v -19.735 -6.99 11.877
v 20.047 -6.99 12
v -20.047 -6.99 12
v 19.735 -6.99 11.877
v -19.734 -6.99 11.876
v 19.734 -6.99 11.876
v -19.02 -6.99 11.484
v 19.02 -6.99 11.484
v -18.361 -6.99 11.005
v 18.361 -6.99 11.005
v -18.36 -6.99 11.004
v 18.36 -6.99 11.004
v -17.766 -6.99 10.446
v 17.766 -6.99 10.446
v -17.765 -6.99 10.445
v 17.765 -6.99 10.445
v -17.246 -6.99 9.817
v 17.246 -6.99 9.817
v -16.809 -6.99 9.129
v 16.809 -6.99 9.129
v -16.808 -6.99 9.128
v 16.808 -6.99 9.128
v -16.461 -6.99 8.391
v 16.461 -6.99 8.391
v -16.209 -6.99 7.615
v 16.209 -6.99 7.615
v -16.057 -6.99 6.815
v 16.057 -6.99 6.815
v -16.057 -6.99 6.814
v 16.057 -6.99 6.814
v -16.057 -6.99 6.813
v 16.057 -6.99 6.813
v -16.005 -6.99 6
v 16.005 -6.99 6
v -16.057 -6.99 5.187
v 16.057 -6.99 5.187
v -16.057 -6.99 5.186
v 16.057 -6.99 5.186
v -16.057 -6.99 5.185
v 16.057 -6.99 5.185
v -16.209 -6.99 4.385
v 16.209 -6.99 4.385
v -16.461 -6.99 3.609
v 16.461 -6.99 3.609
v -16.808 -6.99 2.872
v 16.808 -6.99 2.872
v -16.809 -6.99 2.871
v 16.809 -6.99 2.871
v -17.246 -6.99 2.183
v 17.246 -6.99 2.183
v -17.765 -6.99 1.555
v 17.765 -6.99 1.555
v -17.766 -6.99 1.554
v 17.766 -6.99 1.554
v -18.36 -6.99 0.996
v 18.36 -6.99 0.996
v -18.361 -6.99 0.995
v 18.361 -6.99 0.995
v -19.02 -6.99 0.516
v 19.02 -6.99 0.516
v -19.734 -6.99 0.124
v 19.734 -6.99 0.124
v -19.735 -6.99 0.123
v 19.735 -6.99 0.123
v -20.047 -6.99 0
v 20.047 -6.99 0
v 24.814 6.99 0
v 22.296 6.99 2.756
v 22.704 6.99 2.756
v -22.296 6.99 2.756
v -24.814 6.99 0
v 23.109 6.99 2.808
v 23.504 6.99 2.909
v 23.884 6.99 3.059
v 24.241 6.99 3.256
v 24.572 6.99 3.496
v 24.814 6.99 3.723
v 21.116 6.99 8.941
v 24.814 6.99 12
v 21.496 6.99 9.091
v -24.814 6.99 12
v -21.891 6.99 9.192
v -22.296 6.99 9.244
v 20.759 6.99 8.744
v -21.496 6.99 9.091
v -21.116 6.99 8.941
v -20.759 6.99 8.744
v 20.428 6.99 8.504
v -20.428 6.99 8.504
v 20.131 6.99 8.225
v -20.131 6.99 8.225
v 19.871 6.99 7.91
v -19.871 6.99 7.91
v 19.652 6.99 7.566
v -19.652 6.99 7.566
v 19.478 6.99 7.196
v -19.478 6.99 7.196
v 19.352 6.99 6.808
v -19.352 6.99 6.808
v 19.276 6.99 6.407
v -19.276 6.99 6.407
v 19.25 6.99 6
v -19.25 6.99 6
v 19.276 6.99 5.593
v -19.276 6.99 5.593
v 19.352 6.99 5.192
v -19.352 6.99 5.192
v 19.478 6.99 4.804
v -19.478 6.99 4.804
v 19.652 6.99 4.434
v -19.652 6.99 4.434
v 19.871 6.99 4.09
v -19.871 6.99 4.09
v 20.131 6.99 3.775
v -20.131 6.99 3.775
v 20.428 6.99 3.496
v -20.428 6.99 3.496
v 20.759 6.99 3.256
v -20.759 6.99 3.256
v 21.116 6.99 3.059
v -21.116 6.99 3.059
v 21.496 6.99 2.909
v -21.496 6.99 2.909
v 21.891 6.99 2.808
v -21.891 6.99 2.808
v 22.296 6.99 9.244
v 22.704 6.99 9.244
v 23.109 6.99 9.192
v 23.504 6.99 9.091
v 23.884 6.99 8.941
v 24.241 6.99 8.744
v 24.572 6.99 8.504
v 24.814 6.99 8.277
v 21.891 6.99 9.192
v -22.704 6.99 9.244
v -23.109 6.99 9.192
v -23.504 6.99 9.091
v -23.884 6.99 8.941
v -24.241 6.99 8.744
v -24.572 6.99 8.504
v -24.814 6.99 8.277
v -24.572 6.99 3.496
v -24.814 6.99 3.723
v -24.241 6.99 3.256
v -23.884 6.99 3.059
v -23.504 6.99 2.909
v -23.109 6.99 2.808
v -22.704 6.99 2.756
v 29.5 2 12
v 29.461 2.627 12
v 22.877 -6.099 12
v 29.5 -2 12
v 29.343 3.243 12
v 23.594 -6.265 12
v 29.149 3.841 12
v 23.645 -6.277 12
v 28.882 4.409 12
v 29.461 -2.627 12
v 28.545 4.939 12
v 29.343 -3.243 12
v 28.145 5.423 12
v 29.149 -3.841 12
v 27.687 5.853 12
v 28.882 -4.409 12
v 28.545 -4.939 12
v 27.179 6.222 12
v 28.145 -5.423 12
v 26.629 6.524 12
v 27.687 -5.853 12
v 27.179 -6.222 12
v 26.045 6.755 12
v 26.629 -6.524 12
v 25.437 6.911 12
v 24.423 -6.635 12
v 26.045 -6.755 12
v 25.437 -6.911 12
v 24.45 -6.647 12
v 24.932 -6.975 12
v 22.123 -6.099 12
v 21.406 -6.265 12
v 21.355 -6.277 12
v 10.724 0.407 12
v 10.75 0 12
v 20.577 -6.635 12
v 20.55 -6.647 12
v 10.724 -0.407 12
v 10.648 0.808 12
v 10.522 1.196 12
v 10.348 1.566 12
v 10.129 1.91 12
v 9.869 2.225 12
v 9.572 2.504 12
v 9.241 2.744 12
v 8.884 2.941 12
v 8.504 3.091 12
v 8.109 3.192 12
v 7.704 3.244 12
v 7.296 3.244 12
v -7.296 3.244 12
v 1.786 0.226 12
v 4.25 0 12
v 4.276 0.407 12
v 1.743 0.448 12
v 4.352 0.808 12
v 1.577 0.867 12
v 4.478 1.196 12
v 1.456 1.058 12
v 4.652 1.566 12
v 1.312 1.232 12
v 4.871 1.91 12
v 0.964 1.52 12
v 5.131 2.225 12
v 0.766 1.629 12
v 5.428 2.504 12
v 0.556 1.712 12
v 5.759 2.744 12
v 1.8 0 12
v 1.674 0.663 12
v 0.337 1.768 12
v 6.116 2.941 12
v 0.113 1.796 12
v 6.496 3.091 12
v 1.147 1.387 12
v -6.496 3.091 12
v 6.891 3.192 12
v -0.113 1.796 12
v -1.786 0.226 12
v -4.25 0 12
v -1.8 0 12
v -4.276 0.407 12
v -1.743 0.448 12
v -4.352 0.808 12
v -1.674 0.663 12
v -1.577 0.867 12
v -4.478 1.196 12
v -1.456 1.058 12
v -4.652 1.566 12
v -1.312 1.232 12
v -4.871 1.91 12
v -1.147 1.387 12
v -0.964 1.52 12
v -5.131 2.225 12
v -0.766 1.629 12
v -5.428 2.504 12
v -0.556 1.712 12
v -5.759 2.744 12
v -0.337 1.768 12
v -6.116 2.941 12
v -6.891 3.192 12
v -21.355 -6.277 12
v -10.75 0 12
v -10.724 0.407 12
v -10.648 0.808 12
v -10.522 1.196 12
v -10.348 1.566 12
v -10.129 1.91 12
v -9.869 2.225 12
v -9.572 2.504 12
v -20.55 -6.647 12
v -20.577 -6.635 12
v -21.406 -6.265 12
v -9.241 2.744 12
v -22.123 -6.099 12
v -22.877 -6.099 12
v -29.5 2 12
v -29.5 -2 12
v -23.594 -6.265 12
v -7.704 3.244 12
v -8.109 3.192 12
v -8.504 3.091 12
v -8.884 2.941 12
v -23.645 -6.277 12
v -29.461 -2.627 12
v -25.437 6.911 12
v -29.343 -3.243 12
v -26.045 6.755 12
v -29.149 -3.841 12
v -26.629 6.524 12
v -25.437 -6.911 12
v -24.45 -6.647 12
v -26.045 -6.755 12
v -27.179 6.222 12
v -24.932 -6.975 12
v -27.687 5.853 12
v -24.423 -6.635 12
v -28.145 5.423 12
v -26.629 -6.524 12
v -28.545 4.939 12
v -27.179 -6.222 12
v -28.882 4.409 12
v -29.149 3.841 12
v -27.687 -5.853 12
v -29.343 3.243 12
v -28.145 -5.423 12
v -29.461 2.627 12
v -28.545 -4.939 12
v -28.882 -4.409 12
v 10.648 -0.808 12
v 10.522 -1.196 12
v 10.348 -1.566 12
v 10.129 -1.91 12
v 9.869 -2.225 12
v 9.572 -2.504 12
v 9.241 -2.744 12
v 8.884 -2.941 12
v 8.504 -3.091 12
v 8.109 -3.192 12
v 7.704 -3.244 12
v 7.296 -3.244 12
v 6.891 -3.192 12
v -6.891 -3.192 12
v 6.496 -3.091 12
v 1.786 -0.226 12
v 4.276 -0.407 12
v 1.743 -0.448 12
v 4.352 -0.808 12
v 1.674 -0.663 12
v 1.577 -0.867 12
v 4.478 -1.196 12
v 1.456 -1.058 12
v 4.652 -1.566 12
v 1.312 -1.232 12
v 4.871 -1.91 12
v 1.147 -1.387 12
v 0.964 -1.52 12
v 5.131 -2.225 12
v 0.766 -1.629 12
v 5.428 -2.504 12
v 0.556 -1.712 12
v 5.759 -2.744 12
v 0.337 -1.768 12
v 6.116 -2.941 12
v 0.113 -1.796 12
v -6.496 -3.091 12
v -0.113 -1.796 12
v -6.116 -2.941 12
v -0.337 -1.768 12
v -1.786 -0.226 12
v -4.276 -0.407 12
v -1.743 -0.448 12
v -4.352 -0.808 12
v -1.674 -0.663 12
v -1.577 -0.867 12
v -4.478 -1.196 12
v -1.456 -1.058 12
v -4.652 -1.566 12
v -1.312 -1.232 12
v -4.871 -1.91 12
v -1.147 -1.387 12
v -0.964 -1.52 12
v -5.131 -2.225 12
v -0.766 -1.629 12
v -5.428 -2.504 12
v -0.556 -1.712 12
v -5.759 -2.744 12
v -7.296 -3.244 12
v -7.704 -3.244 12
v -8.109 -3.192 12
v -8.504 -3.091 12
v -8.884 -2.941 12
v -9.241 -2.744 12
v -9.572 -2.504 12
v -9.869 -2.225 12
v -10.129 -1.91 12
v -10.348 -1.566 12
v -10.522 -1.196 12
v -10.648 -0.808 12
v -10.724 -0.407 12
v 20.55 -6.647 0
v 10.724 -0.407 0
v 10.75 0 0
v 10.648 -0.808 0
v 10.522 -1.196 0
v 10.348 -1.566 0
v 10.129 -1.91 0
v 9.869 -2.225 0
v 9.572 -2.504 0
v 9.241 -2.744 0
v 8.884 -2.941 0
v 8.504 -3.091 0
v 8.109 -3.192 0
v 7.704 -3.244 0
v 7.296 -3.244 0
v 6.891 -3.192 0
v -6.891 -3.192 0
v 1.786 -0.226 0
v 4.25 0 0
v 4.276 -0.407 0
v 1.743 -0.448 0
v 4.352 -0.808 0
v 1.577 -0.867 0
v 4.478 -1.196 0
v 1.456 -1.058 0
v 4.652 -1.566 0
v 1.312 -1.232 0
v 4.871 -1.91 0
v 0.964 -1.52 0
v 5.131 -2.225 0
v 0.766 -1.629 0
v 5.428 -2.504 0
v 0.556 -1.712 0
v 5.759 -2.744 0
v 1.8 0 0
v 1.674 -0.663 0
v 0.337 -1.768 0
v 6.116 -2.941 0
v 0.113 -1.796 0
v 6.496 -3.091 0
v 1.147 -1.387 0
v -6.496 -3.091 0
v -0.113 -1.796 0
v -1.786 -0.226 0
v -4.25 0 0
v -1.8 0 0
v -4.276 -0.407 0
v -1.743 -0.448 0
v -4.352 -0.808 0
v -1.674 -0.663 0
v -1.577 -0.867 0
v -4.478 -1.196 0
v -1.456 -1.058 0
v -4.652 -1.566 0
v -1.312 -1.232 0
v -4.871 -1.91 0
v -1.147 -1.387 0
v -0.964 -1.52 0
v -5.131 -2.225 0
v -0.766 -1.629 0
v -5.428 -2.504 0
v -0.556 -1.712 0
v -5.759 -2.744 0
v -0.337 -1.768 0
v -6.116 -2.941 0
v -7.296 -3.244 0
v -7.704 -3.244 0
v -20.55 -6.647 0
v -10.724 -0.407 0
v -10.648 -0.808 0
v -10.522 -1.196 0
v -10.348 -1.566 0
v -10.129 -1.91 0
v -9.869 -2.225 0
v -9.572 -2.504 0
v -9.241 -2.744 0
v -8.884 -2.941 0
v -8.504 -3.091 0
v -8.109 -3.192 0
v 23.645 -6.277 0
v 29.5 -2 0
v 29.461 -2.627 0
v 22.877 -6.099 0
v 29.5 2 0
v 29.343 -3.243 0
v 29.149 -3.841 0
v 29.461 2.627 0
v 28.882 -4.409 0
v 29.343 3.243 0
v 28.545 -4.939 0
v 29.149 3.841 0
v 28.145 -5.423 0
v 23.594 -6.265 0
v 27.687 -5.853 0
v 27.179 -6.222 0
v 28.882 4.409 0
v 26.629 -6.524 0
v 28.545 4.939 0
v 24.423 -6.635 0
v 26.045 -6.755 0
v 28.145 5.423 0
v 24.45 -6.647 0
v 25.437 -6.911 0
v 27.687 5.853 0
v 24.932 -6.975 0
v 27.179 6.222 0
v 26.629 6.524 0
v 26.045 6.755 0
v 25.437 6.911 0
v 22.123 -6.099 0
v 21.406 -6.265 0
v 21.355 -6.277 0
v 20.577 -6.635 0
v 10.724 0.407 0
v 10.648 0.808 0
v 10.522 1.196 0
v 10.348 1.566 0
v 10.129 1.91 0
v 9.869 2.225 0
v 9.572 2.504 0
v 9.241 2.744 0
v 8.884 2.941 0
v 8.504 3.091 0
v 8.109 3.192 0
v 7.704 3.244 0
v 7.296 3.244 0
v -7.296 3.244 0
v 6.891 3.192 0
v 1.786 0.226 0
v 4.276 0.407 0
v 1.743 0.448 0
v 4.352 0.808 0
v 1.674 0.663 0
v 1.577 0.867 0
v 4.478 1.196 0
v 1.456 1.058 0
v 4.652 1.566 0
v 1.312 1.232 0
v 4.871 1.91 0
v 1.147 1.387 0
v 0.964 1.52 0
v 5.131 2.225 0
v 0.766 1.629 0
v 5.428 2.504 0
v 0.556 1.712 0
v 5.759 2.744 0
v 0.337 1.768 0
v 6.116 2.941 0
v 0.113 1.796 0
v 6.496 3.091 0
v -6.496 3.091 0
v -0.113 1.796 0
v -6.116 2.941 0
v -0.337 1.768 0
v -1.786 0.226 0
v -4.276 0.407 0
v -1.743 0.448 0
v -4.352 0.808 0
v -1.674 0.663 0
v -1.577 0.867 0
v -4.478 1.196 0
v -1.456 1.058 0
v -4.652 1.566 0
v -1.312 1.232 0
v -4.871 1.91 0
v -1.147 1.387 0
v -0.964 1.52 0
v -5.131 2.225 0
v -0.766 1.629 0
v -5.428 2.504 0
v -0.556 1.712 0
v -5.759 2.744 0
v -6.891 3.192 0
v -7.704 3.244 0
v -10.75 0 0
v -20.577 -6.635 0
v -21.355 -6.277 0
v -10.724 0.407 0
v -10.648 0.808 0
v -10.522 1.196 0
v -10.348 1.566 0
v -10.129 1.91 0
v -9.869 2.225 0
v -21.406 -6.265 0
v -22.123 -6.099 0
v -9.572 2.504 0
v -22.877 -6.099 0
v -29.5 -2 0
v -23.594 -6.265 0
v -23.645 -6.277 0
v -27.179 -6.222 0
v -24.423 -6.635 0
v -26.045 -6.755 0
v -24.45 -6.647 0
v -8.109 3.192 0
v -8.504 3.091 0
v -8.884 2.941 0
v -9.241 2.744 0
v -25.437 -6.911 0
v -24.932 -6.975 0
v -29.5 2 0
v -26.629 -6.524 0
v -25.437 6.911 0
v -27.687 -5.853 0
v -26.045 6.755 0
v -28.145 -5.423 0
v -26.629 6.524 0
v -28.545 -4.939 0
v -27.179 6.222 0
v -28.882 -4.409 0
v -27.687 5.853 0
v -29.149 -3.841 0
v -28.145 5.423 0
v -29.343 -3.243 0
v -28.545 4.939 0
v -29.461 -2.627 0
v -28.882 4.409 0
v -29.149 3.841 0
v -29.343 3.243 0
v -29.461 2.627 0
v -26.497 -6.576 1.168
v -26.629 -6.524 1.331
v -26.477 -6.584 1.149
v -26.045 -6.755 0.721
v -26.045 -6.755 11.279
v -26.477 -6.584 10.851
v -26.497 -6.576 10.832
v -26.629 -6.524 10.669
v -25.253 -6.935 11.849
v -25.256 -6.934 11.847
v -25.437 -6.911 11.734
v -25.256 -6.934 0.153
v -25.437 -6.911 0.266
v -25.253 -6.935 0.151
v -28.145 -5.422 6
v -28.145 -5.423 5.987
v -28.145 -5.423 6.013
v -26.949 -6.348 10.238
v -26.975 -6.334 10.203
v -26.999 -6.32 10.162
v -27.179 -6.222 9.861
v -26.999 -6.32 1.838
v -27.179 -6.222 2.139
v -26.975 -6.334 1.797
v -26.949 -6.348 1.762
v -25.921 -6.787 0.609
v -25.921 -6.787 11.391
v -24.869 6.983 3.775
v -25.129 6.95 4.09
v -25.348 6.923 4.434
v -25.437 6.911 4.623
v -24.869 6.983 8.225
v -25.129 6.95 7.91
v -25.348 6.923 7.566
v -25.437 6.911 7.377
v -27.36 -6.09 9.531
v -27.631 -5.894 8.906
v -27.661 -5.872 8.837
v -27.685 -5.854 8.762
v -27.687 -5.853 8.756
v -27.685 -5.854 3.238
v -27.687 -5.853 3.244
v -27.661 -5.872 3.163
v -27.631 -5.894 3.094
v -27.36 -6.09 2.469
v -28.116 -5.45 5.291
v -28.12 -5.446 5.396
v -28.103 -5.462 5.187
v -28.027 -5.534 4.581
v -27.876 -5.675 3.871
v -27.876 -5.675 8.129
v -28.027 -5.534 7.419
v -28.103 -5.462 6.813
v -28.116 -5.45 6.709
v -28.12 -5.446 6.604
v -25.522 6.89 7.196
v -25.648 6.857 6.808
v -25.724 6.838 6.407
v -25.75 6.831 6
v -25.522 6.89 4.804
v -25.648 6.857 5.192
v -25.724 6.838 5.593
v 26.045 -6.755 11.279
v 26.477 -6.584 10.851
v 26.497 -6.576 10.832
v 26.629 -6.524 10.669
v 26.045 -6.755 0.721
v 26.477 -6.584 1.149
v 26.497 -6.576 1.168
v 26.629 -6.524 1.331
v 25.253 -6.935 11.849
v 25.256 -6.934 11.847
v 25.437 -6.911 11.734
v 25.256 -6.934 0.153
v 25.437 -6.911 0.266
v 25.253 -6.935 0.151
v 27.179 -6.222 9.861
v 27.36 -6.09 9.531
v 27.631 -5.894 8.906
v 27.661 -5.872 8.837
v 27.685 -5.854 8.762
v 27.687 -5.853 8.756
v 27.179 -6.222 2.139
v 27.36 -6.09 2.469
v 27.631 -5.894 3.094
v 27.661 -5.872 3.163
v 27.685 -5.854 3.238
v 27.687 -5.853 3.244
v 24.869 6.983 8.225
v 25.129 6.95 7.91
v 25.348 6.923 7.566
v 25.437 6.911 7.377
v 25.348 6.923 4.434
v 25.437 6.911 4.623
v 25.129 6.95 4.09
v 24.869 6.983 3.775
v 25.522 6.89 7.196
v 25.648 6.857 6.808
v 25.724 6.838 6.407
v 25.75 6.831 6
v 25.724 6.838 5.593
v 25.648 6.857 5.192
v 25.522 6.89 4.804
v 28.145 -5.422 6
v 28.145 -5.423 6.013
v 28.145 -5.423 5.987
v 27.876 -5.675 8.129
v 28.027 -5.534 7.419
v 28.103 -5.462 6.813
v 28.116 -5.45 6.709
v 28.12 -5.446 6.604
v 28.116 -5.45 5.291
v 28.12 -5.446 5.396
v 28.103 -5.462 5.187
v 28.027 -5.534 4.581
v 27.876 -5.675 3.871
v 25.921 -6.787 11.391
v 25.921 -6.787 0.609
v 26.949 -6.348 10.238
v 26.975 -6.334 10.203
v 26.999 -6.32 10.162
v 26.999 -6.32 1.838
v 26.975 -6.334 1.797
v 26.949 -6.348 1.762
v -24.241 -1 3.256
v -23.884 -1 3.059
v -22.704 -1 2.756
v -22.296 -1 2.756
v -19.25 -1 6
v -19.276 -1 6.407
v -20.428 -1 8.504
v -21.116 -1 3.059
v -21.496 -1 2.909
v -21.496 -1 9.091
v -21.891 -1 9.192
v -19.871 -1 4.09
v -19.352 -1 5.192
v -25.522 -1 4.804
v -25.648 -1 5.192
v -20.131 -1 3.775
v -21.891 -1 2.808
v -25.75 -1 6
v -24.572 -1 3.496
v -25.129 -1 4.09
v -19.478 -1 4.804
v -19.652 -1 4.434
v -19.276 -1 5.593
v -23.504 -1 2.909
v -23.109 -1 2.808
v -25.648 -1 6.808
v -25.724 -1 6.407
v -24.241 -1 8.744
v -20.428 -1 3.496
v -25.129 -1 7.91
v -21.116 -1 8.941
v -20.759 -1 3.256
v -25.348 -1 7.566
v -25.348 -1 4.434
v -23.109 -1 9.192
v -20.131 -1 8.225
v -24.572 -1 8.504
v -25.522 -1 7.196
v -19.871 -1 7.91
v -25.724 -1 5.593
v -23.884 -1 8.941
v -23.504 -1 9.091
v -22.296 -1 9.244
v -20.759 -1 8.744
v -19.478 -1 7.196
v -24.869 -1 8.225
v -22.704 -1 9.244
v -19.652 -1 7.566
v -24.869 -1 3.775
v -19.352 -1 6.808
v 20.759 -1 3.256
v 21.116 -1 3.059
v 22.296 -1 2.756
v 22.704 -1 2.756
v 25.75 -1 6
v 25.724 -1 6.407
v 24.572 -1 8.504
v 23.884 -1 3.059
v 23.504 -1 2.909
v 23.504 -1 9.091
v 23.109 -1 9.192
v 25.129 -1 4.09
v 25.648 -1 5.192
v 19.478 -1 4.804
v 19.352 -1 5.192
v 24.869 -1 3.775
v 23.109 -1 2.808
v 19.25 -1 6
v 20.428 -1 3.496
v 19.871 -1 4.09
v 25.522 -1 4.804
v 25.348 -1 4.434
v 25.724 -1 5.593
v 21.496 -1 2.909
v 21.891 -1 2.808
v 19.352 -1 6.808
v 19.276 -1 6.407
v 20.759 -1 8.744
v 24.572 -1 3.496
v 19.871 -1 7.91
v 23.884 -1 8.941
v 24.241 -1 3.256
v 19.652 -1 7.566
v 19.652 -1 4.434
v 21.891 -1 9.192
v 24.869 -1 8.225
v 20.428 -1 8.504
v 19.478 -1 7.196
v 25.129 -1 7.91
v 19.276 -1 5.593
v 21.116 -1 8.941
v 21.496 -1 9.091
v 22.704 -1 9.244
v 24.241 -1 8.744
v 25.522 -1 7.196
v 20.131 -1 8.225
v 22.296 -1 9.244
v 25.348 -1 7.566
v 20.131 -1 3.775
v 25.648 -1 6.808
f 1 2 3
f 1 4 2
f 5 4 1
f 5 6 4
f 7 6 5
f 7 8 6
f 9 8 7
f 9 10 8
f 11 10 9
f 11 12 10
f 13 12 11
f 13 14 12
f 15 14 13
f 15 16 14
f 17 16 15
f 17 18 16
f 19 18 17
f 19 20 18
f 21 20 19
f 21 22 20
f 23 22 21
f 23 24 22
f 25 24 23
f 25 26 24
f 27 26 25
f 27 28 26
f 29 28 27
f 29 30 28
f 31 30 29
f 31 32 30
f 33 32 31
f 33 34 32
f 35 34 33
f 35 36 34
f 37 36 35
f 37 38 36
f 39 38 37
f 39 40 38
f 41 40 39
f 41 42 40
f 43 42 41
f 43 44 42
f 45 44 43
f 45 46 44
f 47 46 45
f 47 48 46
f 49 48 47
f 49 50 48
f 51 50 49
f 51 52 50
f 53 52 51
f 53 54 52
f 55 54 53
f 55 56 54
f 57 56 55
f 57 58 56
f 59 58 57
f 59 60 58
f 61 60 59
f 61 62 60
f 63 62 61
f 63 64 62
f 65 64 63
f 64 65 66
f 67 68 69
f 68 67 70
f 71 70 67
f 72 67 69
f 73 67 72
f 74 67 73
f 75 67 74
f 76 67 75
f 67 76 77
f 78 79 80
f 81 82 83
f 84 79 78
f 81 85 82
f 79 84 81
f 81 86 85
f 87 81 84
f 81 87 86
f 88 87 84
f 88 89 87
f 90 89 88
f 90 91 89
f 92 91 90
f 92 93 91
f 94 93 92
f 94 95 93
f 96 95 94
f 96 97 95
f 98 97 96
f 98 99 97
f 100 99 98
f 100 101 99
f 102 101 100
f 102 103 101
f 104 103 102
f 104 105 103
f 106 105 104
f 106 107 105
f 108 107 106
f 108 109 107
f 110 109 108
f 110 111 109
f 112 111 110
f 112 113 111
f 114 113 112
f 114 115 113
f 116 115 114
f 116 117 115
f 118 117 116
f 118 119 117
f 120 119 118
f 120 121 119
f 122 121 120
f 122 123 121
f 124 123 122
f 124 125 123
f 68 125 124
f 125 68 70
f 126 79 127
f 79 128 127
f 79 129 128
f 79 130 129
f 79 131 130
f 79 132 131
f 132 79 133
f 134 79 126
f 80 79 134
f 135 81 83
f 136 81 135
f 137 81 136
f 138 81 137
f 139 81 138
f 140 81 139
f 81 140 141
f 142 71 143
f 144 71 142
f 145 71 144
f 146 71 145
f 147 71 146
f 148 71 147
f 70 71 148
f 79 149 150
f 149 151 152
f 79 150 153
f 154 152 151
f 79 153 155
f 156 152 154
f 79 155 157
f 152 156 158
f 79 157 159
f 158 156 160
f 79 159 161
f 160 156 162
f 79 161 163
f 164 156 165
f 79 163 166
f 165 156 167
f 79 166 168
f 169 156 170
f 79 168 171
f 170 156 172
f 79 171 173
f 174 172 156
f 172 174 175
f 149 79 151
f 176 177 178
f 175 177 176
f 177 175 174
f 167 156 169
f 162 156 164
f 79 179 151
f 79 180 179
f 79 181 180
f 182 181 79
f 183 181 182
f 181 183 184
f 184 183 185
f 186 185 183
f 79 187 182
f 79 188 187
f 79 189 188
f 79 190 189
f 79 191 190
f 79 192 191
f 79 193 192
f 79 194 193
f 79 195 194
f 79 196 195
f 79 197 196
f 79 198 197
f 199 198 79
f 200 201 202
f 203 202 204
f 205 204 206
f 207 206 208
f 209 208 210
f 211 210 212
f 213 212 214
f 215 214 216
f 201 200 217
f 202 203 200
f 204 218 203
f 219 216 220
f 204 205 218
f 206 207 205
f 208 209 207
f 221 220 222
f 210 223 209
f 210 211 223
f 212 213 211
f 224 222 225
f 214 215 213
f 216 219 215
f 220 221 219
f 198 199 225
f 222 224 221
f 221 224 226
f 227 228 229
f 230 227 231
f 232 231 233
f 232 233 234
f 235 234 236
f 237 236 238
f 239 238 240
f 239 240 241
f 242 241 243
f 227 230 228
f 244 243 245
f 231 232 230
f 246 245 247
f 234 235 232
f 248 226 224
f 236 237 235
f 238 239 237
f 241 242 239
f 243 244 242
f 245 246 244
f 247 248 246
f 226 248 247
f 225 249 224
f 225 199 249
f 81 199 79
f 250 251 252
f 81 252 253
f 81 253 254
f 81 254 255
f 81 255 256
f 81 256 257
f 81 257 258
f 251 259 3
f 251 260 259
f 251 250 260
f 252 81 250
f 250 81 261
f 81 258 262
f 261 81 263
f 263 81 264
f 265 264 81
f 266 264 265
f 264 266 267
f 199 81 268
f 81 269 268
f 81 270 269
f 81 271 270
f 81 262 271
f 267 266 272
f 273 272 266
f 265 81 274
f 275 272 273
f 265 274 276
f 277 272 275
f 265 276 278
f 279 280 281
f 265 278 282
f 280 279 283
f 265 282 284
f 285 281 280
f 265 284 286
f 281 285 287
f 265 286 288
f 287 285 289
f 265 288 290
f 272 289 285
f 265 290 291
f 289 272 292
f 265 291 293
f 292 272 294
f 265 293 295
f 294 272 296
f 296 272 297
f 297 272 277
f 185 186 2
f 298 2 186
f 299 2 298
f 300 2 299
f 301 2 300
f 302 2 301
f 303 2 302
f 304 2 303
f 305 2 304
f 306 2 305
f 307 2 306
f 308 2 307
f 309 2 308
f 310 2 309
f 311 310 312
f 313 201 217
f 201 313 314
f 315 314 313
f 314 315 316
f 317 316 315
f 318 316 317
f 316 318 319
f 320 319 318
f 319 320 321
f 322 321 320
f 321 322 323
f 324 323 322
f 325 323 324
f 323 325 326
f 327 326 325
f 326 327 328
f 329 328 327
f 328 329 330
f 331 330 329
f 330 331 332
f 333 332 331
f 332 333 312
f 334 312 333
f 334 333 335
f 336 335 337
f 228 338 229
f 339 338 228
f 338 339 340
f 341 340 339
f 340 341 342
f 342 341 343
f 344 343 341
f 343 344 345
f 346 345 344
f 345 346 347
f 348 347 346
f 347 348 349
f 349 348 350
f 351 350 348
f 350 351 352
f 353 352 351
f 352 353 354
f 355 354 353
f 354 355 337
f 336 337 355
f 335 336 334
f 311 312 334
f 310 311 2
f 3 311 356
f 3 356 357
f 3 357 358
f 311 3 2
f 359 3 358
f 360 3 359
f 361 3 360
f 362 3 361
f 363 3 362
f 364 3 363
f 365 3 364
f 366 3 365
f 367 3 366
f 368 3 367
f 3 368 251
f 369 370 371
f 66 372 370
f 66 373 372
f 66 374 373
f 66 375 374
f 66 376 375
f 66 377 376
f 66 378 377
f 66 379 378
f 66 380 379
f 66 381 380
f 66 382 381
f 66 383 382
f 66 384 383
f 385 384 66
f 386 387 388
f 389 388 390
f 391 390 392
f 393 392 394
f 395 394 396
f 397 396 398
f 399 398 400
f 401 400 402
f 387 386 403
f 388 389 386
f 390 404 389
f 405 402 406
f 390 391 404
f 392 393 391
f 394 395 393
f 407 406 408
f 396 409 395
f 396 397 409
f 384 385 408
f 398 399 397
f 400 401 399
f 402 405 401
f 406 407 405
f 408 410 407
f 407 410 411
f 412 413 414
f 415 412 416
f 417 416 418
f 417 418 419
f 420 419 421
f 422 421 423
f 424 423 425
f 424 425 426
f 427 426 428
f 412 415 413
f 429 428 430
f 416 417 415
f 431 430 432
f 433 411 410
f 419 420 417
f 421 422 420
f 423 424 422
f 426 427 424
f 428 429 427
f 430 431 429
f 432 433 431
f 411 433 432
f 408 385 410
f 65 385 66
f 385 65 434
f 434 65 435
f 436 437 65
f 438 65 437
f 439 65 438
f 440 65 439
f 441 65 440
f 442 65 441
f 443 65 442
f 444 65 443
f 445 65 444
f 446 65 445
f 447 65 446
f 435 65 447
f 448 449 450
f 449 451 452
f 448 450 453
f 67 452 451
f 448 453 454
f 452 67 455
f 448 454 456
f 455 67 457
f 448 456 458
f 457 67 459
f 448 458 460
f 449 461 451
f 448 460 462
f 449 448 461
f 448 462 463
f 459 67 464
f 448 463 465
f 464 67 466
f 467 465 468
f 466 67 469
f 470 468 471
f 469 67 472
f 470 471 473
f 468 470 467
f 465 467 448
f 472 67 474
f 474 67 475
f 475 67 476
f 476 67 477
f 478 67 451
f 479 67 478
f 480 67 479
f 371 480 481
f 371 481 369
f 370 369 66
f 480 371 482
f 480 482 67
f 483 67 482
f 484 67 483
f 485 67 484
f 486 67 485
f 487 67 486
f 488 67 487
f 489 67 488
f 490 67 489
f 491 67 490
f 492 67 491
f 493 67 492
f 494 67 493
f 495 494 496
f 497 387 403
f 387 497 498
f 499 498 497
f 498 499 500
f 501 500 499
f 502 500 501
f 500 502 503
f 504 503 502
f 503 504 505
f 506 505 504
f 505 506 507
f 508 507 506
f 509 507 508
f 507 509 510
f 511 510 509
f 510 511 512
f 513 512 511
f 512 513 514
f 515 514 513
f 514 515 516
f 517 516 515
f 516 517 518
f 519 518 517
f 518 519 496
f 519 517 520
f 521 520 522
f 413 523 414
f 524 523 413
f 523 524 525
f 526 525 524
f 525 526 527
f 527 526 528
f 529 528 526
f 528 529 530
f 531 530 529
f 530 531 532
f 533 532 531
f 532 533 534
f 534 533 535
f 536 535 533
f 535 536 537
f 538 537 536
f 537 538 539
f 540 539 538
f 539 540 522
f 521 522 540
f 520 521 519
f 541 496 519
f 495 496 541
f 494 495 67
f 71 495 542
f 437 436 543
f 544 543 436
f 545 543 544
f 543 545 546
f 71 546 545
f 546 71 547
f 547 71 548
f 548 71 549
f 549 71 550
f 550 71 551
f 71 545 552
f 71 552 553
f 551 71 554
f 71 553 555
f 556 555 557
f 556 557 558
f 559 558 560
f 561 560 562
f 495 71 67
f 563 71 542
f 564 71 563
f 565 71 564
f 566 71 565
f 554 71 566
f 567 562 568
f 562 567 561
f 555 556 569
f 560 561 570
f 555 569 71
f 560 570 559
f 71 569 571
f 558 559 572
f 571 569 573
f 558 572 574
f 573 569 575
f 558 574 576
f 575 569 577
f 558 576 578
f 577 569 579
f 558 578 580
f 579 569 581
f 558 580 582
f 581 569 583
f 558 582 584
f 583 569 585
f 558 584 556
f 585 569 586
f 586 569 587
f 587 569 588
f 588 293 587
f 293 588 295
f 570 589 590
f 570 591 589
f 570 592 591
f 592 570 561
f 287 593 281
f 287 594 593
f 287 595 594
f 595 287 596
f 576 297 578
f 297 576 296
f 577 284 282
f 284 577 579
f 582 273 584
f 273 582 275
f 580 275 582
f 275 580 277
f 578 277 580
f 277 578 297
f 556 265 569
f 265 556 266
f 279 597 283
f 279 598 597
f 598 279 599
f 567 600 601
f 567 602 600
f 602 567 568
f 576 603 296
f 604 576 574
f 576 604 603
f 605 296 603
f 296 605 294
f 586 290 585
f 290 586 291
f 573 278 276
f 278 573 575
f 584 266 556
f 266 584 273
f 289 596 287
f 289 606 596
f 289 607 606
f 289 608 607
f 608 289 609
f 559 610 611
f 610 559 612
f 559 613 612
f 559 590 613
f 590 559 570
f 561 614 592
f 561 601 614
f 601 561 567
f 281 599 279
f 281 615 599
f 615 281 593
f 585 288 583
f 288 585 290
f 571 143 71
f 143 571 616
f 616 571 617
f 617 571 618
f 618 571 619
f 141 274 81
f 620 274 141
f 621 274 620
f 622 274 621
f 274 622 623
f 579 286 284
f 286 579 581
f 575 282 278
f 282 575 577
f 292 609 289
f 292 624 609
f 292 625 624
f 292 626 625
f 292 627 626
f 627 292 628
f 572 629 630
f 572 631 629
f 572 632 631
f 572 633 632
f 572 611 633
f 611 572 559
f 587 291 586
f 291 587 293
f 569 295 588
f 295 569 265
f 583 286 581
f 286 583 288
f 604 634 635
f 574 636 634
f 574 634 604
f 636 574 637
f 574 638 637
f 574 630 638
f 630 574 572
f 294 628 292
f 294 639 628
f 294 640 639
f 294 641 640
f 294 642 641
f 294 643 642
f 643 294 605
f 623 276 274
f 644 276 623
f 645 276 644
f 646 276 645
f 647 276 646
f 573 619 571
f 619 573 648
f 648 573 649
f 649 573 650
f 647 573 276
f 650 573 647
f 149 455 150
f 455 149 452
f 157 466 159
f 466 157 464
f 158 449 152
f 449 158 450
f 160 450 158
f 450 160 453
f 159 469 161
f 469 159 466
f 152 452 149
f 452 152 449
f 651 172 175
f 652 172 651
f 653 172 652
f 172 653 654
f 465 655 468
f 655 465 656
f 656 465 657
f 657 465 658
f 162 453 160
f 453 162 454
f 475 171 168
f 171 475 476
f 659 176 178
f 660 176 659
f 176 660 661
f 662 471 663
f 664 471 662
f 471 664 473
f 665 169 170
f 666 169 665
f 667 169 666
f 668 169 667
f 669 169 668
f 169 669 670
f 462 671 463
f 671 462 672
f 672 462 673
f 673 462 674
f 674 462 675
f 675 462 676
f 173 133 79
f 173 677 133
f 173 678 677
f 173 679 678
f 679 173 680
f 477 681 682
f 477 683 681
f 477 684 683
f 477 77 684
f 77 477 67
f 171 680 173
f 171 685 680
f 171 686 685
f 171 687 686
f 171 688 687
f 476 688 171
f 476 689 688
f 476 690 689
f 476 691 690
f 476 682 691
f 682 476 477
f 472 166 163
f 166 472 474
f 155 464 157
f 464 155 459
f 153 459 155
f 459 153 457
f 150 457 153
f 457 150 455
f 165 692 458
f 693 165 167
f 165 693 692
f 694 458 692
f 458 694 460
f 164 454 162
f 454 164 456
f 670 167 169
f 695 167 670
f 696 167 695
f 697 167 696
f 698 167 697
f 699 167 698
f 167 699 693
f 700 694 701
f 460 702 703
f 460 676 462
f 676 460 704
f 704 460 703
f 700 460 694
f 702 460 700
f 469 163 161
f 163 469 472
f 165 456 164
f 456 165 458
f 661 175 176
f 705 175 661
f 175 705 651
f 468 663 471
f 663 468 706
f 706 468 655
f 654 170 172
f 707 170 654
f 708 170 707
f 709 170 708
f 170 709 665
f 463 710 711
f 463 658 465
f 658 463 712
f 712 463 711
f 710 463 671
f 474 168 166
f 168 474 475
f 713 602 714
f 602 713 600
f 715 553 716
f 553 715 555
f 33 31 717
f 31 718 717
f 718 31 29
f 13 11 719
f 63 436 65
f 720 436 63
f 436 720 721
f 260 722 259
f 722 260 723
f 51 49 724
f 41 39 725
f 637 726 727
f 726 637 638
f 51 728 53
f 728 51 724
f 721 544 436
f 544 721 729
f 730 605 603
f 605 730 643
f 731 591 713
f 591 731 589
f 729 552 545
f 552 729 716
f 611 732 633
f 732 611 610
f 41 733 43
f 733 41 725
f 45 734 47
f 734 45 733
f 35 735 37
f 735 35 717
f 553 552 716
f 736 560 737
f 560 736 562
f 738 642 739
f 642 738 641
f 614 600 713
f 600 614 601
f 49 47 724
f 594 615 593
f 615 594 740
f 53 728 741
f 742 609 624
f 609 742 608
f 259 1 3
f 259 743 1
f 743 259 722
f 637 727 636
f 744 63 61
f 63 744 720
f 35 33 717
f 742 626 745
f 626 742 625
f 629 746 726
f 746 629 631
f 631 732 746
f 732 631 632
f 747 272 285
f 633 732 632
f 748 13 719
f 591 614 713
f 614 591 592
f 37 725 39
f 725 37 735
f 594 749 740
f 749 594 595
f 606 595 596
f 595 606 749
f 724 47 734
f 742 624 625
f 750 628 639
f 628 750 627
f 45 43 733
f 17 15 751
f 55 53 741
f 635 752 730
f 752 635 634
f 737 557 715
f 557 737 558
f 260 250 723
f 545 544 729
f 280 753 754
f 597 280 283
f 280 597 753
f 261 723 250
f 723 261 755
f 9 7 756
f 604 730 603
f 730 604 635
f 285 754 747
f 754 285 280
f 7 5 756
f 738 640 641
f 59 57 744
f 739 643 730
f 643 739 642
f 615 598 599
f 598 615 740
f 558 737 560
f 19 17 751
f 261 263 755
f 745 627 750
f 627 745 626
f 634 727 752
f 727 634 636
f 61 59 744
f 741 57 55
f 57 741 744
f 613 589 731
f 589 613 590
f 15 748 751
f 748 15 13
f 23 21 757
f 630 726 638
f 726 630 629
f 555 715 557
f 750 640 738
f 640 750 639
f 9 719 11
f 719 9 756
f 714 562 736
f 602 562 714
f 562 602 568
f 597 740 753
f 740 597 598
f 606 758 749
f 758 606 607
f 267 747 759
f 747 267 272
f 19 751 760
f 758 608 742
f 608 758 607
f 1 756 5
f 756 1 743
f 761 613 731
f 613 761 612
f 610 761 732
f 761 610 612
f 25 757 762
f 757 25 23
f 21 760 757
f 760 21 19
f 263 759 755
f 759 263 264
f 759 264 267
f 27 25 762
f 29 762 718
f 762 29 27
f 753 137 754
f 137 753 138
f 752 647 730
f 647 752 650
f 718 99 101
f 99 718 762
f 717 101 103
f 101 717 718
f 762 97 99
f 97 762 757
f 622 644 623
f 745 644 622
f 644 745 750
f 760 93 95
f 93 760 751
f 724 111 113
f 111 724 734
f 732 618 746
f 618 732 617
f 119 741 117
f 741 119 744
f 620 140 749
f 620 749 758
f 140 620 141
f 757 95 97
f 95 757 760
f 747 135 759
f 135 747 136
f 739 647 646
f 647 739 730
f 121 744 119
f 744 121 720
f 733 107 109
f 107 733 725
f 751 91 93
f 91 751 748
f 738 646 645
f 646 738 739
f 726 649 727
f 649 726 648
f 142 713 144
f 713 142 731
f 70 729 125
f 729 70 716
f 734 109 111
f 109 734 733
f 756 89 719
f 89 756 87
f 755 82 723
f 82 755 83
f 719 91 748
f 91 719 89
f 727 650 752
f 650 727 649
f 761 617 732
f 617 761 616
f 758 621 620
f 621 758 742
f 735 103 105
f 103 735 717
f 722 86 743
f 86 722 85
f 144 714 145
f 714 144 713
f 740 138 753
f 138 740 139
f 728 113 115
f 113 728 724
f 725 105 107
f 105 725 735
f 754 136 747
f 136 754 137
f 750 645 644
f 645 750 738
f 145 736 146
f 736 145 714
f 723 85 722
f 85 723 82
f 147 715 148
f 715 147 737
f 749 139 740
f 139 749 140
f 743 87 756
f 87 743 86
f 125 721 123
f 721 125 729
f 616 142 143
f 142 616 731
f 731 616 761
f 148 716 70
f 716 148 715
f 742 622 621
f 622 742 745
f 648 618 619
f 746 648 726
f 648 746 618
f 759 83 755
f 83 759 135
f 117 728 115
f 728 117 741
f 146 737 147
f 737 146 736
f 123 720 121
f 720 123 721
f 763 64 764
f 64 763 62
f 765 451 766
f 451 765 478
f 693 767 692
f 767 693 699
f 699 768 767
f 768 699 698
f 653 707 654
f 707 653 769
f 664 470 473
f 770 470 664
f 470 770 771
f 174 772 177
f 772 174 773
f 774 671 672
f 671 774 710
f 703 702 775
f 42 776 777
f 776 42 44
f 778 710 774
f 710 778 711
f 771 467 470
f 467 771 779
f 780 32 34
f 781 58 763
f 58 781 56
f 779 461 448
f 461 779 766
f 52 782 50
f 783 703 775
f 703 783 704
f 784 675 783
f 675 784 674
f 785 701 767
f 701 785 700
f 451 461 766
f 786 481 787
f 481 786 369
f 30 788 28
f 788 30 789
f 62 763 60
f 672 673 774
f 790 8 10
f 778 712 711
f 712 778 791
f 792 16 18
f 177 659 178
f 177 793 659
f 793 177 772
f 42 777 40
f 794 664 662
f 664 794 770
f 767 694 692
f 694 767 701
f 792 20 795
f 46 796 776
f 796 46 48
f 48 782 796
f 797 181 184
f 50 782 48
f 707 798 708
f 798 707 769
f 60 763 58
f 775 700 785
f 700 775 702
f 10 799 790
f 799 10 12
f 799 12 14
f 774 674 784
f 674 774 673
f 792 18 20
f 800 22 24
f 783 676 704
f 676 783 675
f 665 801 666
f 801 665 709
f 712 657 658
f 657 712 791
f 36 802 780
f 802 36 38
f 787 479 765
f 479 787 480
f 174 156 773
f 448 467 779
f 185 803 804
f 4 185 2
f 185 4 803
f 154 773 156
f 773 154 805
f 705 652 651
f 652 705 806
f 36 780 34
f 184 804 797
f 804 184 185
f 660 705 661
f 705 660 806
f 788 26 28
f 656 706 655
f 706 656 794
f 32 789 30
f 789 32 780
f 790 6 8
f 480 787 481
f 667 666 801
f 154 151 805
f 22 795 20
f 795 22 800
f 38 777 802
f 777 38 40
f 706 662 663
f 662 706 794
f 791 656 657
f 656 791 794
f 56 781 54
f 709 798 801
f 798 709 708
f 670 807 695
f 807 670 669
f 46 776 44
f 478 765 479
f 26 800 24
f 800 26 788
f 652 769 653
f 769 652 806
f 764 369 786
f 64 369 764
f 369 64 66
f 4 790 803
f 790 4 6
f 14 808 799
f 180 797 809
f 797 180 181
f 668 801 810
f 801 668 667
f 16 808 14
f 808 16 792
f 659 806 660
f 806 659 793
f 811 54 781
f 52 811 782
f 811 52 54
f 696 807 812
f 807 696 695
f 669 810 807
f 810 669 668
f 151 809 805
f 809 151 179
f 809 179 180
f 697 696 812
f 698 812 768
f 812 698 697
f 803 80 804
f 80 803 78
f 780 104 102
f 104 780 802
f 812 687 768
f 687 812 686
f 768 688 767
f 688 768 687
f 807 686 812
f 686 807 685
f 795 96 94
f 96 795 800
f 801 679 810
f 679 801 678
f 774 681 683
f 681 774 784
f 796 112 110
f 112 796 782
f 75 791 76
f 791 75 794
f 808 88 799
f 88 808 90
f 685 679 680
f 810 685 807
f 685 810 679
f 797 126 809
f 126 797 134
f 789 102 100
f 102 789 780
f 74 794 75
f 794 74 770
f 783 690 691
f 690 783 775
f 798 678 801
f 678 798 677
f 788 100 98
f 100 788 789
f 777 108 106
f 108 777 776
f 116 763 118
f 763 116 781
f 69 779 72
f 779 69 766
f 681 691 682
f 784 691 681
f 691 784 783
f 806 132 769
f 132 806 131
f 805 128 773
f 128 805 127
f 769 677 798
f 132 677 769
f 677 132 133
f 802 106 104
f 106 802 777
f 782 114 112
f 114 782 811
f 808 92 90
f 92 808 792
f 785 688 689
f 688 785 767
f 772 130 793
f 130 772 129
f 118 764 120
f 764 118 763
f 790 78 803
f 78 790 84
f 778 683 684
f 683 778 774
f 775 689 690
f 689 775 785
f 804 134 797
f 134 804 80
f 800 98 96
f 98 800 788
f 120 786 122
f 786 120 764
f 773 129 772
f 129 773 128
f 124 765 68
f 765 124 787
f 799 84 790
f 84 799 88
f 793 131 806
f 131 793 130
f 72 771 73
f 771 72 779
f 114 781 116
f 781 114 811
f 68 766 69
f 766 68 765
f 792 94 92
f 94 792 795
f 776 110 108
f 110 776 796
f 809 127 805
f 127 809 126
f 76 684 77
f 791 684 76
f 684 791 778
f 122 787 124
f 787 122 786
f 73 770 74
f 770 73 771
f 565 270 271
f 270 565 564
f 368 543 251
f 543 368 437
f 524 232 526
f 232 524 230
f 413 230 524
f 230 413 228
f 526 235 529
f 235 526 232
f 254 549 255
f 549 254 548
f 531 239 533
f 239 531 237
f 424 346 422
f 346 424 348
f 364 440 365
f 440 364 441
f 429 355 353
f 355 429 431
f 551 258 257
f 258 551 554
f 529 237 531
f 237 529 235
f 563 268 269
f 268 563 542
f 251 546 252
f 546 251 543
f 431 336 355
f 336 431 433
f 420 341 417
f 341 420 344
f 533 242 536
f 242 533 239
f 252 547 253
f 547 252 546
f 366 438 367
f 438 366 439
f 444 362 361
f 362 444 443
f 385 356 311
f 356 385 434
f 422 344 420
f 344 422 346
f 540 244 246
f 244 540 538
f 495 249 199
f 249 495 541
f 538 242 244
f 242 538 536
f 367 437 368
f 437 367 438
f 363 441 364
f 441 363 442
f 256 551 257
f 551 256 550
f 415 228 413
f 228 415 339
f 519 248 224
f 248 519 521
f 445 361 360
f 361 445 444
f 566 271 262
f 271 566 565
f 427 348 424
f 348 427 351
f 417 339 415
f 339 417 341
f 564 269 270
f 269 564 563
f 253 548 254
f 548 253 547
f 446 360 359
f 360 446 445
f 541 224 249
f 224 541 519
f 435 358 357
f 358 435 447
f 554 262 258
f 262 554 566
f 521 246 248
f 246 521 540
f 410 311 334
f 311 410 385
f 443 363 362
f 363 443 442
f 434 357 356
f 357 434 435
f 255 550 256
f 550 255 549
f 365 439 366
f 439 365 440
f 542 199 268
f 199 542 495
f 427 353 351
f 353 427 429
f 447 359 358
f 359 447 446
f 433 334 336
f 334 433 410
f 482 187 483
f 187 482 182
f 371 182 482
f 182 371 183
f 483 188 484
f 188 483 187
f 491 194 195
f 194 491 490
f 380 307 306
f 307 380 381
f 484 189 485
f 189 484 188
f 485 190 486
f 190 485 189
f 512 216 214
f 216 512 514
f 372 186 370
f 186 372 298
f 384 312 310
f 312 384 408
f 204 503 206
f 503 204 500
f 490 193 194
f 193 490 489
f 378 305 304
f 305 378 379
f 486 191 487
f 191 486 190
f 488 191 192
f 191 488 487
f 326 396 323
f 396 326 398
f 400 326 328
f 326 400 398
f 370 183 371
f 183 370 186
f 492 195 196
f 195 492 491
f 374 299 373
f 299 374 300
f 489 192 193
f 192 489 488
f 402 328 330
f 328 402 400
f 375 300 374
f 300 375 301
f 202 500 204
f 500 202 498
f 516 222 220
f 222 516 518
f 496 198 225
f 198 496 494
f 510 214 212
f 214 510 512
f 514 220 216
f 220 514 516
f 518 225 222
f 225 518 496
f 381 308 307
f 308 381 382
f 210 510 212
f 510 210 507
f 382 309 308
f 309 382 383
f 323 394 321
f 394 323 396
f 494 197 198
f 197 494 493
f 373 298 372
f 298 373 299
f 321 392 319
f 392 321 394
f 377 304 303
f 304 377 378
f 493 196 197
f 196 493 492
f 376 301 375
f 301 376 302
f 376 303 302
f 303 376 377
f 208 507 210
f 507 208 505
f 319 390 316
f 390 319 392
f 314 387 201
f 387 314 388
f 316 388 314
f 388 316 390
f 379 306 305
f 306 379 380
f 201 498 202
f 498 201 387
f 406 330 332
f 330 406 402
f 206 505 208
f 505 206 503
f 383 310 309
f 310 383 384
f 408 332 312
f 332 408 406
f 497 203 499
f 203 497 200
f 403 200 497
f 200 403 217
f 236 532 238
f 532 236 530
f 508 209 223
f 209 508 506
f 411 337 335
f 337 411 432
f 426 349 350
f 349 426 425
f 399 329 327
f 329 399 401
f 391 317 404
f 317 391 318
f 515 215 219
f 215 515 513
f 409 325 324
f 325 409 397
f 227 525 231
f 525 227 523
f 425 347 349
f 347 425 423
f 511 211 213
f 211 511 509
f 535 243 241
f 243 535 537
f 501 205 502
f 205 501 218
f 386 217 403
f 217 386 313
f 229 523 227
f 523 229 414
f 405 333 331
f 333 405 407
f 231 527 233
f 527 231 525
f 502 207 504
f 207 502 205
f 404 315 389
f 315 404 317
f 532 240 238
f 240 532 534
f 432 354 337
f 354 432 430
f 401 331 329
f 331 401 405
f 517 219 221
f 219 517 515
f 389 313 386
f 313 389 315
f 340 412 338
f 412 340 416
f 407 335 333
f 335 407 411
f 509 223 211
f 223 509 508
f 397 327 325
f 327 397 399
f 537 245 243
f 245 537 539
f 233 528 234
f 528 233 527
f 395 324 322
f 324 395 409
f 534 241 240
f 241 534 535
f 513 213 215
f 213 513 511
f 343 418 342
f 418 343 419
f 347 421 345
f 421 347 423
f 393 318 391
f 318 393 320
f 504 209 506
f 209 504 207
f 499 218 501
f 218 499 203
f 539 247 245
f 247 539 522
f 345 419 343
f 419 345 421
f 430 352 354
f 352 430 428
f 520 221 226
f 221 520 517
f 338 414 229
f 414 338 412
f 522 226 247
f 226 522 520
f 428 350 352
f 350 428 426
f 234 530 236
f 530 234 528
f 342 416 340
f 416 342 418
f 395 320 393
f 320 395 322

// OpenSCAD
$fn = 50;


difference() {
	union() {
		hull() {
			translate(v = [-9.5000000000, 2.0000000000, 0]) {
				cylinder(h = 12, r = 5);
			}
			translate(v = [9.5000000000, 2.0000000000, 0]) {
				cylinder(h = 12, r = 5);
			}
			translate(v = [-9.5000000000, -2.0000000000, 0]) {
				cylinder(h = 12, r = 5);
			}
			translate(v = [9.5000000000, -2.0000000000, 0]) {
				cylinder(h = 12, r = 5);
			}
		}
		translate(v = [-15.0000000000, 0.0000000000, 0]) {
			hull() {
				translate(v = [-9.5000000000, 2.0000000000, 0]) {
					cylinder(h = 12, r = 5);
				}
				translate(v = [9.5000000000, 2.0000000000, 0]) {
					cylinder(h = 12, r = 5);
				}
				translate(v = [-9.5000000000, -2.0000000000, 0]) {
					cylinder(h = 12, r = 5);
				}
				translate(v = [9.5000000000, -2.0000000000, 0]) {
					cylinder(h = 12, r = 5);
				}
			}
		}
		translate(v = [15.0000000000, 0.0000000000, 0]) {
			hull() {
				translate(v = [-9.5000000000, 2.0000000000, 0]) {
					cylinder(h = 12, r = 5);
				}
				translate(v = [9.5000000000, 2.0000000000, 0]) {
					cylinder(h = 12, r = 5);
				}
				translate(v = [-9.5000000000, -2.0000000000, 0]) {
					cylinder(h = 12, r = 5);
				}
				translate(v = [9.5000000000, -2.0000000000, 0]) {
					cylinder(h = 12, r = 5);
				}
			}
		}
	}
	union() {
		translate(v = [-22.5000000000, -7.0000000000, 6.0000000000]) {
			rotate(a = [90, 0, 0]) {
				difference() {
					union() {
						#translate(v = [0, 0, -14.0000000000]) {
							cylinder(h = 14, r = 2.2500000000);
						}
						#translate(v = [0, 0, -6]) {
							cylinder(h = 6, r1 = 3.2500000000, r2 = 6.5000000000);
						}
						#translate(v = [0, 0, -14.0000000000]) {
							cylinder(h = 14, r = 3.2500000000);
						}
						#translate(v = [0, 0, -14.0000000000]) {
							cylinder(h = 14, r = 2.2500000000);
						}
					}
					union();
				}
			}
		}
		translate(v = [22.5000000000, -7.0000000000, 6.0000000000]) {
			rotate(a = [90, 0, 0]) {
				difference() {
					union() {
						#translate(v = [0, 0, -14.0000000000]) {
							cylinder(h = 14, r = 2.2500000000);
						}
						#translate(v = [0, 0, -6]) {
							cylinder(h = 6, r1 = 3.2500000000, r2 = 6.5000000000);
						}
						#translate(v = [0, 0, -14.0000000000]) {
							cylinder(h = 14, r = 3.2500000000);
						}
						#translate(v = [0, 0, -14.0000000000]) {
							cylinder(h = 14, r = 2.2500000000);
						}
					}
					union();
				}
			}
		}
		translate(v = [-7.5000000000, 0.0000000000, 0]) {
			translate(v = [0, 0, -100]) {
				cylinder(h = 200, r = 3.2500000000);
			}
		}
		translate(v = [7.5000000000, 0.0000000000, 0]) {
			translate(v = [0, 0, -100]) {
				cylinder(h = 200, r = 3.2500000000);
			}
		}
		translate(v = [-7.5000000000, 0.0000000000, 0]) {
			translate(v = [0, 0, -100]) {
				cylinder(h = 200, r = 1.8000000000);
			}
		}
		translate(v = [0, 0, -100]) {
			cylinder(h = 200, r = 1.8000000000);
		}
		translate(v = [7.5000000000, 0.0000000000, 0]) {
			translate(v = [0, 0, -100]) {
				cylinder(h = 200, r = 1.8000000000);
			}
		}
	}
}
